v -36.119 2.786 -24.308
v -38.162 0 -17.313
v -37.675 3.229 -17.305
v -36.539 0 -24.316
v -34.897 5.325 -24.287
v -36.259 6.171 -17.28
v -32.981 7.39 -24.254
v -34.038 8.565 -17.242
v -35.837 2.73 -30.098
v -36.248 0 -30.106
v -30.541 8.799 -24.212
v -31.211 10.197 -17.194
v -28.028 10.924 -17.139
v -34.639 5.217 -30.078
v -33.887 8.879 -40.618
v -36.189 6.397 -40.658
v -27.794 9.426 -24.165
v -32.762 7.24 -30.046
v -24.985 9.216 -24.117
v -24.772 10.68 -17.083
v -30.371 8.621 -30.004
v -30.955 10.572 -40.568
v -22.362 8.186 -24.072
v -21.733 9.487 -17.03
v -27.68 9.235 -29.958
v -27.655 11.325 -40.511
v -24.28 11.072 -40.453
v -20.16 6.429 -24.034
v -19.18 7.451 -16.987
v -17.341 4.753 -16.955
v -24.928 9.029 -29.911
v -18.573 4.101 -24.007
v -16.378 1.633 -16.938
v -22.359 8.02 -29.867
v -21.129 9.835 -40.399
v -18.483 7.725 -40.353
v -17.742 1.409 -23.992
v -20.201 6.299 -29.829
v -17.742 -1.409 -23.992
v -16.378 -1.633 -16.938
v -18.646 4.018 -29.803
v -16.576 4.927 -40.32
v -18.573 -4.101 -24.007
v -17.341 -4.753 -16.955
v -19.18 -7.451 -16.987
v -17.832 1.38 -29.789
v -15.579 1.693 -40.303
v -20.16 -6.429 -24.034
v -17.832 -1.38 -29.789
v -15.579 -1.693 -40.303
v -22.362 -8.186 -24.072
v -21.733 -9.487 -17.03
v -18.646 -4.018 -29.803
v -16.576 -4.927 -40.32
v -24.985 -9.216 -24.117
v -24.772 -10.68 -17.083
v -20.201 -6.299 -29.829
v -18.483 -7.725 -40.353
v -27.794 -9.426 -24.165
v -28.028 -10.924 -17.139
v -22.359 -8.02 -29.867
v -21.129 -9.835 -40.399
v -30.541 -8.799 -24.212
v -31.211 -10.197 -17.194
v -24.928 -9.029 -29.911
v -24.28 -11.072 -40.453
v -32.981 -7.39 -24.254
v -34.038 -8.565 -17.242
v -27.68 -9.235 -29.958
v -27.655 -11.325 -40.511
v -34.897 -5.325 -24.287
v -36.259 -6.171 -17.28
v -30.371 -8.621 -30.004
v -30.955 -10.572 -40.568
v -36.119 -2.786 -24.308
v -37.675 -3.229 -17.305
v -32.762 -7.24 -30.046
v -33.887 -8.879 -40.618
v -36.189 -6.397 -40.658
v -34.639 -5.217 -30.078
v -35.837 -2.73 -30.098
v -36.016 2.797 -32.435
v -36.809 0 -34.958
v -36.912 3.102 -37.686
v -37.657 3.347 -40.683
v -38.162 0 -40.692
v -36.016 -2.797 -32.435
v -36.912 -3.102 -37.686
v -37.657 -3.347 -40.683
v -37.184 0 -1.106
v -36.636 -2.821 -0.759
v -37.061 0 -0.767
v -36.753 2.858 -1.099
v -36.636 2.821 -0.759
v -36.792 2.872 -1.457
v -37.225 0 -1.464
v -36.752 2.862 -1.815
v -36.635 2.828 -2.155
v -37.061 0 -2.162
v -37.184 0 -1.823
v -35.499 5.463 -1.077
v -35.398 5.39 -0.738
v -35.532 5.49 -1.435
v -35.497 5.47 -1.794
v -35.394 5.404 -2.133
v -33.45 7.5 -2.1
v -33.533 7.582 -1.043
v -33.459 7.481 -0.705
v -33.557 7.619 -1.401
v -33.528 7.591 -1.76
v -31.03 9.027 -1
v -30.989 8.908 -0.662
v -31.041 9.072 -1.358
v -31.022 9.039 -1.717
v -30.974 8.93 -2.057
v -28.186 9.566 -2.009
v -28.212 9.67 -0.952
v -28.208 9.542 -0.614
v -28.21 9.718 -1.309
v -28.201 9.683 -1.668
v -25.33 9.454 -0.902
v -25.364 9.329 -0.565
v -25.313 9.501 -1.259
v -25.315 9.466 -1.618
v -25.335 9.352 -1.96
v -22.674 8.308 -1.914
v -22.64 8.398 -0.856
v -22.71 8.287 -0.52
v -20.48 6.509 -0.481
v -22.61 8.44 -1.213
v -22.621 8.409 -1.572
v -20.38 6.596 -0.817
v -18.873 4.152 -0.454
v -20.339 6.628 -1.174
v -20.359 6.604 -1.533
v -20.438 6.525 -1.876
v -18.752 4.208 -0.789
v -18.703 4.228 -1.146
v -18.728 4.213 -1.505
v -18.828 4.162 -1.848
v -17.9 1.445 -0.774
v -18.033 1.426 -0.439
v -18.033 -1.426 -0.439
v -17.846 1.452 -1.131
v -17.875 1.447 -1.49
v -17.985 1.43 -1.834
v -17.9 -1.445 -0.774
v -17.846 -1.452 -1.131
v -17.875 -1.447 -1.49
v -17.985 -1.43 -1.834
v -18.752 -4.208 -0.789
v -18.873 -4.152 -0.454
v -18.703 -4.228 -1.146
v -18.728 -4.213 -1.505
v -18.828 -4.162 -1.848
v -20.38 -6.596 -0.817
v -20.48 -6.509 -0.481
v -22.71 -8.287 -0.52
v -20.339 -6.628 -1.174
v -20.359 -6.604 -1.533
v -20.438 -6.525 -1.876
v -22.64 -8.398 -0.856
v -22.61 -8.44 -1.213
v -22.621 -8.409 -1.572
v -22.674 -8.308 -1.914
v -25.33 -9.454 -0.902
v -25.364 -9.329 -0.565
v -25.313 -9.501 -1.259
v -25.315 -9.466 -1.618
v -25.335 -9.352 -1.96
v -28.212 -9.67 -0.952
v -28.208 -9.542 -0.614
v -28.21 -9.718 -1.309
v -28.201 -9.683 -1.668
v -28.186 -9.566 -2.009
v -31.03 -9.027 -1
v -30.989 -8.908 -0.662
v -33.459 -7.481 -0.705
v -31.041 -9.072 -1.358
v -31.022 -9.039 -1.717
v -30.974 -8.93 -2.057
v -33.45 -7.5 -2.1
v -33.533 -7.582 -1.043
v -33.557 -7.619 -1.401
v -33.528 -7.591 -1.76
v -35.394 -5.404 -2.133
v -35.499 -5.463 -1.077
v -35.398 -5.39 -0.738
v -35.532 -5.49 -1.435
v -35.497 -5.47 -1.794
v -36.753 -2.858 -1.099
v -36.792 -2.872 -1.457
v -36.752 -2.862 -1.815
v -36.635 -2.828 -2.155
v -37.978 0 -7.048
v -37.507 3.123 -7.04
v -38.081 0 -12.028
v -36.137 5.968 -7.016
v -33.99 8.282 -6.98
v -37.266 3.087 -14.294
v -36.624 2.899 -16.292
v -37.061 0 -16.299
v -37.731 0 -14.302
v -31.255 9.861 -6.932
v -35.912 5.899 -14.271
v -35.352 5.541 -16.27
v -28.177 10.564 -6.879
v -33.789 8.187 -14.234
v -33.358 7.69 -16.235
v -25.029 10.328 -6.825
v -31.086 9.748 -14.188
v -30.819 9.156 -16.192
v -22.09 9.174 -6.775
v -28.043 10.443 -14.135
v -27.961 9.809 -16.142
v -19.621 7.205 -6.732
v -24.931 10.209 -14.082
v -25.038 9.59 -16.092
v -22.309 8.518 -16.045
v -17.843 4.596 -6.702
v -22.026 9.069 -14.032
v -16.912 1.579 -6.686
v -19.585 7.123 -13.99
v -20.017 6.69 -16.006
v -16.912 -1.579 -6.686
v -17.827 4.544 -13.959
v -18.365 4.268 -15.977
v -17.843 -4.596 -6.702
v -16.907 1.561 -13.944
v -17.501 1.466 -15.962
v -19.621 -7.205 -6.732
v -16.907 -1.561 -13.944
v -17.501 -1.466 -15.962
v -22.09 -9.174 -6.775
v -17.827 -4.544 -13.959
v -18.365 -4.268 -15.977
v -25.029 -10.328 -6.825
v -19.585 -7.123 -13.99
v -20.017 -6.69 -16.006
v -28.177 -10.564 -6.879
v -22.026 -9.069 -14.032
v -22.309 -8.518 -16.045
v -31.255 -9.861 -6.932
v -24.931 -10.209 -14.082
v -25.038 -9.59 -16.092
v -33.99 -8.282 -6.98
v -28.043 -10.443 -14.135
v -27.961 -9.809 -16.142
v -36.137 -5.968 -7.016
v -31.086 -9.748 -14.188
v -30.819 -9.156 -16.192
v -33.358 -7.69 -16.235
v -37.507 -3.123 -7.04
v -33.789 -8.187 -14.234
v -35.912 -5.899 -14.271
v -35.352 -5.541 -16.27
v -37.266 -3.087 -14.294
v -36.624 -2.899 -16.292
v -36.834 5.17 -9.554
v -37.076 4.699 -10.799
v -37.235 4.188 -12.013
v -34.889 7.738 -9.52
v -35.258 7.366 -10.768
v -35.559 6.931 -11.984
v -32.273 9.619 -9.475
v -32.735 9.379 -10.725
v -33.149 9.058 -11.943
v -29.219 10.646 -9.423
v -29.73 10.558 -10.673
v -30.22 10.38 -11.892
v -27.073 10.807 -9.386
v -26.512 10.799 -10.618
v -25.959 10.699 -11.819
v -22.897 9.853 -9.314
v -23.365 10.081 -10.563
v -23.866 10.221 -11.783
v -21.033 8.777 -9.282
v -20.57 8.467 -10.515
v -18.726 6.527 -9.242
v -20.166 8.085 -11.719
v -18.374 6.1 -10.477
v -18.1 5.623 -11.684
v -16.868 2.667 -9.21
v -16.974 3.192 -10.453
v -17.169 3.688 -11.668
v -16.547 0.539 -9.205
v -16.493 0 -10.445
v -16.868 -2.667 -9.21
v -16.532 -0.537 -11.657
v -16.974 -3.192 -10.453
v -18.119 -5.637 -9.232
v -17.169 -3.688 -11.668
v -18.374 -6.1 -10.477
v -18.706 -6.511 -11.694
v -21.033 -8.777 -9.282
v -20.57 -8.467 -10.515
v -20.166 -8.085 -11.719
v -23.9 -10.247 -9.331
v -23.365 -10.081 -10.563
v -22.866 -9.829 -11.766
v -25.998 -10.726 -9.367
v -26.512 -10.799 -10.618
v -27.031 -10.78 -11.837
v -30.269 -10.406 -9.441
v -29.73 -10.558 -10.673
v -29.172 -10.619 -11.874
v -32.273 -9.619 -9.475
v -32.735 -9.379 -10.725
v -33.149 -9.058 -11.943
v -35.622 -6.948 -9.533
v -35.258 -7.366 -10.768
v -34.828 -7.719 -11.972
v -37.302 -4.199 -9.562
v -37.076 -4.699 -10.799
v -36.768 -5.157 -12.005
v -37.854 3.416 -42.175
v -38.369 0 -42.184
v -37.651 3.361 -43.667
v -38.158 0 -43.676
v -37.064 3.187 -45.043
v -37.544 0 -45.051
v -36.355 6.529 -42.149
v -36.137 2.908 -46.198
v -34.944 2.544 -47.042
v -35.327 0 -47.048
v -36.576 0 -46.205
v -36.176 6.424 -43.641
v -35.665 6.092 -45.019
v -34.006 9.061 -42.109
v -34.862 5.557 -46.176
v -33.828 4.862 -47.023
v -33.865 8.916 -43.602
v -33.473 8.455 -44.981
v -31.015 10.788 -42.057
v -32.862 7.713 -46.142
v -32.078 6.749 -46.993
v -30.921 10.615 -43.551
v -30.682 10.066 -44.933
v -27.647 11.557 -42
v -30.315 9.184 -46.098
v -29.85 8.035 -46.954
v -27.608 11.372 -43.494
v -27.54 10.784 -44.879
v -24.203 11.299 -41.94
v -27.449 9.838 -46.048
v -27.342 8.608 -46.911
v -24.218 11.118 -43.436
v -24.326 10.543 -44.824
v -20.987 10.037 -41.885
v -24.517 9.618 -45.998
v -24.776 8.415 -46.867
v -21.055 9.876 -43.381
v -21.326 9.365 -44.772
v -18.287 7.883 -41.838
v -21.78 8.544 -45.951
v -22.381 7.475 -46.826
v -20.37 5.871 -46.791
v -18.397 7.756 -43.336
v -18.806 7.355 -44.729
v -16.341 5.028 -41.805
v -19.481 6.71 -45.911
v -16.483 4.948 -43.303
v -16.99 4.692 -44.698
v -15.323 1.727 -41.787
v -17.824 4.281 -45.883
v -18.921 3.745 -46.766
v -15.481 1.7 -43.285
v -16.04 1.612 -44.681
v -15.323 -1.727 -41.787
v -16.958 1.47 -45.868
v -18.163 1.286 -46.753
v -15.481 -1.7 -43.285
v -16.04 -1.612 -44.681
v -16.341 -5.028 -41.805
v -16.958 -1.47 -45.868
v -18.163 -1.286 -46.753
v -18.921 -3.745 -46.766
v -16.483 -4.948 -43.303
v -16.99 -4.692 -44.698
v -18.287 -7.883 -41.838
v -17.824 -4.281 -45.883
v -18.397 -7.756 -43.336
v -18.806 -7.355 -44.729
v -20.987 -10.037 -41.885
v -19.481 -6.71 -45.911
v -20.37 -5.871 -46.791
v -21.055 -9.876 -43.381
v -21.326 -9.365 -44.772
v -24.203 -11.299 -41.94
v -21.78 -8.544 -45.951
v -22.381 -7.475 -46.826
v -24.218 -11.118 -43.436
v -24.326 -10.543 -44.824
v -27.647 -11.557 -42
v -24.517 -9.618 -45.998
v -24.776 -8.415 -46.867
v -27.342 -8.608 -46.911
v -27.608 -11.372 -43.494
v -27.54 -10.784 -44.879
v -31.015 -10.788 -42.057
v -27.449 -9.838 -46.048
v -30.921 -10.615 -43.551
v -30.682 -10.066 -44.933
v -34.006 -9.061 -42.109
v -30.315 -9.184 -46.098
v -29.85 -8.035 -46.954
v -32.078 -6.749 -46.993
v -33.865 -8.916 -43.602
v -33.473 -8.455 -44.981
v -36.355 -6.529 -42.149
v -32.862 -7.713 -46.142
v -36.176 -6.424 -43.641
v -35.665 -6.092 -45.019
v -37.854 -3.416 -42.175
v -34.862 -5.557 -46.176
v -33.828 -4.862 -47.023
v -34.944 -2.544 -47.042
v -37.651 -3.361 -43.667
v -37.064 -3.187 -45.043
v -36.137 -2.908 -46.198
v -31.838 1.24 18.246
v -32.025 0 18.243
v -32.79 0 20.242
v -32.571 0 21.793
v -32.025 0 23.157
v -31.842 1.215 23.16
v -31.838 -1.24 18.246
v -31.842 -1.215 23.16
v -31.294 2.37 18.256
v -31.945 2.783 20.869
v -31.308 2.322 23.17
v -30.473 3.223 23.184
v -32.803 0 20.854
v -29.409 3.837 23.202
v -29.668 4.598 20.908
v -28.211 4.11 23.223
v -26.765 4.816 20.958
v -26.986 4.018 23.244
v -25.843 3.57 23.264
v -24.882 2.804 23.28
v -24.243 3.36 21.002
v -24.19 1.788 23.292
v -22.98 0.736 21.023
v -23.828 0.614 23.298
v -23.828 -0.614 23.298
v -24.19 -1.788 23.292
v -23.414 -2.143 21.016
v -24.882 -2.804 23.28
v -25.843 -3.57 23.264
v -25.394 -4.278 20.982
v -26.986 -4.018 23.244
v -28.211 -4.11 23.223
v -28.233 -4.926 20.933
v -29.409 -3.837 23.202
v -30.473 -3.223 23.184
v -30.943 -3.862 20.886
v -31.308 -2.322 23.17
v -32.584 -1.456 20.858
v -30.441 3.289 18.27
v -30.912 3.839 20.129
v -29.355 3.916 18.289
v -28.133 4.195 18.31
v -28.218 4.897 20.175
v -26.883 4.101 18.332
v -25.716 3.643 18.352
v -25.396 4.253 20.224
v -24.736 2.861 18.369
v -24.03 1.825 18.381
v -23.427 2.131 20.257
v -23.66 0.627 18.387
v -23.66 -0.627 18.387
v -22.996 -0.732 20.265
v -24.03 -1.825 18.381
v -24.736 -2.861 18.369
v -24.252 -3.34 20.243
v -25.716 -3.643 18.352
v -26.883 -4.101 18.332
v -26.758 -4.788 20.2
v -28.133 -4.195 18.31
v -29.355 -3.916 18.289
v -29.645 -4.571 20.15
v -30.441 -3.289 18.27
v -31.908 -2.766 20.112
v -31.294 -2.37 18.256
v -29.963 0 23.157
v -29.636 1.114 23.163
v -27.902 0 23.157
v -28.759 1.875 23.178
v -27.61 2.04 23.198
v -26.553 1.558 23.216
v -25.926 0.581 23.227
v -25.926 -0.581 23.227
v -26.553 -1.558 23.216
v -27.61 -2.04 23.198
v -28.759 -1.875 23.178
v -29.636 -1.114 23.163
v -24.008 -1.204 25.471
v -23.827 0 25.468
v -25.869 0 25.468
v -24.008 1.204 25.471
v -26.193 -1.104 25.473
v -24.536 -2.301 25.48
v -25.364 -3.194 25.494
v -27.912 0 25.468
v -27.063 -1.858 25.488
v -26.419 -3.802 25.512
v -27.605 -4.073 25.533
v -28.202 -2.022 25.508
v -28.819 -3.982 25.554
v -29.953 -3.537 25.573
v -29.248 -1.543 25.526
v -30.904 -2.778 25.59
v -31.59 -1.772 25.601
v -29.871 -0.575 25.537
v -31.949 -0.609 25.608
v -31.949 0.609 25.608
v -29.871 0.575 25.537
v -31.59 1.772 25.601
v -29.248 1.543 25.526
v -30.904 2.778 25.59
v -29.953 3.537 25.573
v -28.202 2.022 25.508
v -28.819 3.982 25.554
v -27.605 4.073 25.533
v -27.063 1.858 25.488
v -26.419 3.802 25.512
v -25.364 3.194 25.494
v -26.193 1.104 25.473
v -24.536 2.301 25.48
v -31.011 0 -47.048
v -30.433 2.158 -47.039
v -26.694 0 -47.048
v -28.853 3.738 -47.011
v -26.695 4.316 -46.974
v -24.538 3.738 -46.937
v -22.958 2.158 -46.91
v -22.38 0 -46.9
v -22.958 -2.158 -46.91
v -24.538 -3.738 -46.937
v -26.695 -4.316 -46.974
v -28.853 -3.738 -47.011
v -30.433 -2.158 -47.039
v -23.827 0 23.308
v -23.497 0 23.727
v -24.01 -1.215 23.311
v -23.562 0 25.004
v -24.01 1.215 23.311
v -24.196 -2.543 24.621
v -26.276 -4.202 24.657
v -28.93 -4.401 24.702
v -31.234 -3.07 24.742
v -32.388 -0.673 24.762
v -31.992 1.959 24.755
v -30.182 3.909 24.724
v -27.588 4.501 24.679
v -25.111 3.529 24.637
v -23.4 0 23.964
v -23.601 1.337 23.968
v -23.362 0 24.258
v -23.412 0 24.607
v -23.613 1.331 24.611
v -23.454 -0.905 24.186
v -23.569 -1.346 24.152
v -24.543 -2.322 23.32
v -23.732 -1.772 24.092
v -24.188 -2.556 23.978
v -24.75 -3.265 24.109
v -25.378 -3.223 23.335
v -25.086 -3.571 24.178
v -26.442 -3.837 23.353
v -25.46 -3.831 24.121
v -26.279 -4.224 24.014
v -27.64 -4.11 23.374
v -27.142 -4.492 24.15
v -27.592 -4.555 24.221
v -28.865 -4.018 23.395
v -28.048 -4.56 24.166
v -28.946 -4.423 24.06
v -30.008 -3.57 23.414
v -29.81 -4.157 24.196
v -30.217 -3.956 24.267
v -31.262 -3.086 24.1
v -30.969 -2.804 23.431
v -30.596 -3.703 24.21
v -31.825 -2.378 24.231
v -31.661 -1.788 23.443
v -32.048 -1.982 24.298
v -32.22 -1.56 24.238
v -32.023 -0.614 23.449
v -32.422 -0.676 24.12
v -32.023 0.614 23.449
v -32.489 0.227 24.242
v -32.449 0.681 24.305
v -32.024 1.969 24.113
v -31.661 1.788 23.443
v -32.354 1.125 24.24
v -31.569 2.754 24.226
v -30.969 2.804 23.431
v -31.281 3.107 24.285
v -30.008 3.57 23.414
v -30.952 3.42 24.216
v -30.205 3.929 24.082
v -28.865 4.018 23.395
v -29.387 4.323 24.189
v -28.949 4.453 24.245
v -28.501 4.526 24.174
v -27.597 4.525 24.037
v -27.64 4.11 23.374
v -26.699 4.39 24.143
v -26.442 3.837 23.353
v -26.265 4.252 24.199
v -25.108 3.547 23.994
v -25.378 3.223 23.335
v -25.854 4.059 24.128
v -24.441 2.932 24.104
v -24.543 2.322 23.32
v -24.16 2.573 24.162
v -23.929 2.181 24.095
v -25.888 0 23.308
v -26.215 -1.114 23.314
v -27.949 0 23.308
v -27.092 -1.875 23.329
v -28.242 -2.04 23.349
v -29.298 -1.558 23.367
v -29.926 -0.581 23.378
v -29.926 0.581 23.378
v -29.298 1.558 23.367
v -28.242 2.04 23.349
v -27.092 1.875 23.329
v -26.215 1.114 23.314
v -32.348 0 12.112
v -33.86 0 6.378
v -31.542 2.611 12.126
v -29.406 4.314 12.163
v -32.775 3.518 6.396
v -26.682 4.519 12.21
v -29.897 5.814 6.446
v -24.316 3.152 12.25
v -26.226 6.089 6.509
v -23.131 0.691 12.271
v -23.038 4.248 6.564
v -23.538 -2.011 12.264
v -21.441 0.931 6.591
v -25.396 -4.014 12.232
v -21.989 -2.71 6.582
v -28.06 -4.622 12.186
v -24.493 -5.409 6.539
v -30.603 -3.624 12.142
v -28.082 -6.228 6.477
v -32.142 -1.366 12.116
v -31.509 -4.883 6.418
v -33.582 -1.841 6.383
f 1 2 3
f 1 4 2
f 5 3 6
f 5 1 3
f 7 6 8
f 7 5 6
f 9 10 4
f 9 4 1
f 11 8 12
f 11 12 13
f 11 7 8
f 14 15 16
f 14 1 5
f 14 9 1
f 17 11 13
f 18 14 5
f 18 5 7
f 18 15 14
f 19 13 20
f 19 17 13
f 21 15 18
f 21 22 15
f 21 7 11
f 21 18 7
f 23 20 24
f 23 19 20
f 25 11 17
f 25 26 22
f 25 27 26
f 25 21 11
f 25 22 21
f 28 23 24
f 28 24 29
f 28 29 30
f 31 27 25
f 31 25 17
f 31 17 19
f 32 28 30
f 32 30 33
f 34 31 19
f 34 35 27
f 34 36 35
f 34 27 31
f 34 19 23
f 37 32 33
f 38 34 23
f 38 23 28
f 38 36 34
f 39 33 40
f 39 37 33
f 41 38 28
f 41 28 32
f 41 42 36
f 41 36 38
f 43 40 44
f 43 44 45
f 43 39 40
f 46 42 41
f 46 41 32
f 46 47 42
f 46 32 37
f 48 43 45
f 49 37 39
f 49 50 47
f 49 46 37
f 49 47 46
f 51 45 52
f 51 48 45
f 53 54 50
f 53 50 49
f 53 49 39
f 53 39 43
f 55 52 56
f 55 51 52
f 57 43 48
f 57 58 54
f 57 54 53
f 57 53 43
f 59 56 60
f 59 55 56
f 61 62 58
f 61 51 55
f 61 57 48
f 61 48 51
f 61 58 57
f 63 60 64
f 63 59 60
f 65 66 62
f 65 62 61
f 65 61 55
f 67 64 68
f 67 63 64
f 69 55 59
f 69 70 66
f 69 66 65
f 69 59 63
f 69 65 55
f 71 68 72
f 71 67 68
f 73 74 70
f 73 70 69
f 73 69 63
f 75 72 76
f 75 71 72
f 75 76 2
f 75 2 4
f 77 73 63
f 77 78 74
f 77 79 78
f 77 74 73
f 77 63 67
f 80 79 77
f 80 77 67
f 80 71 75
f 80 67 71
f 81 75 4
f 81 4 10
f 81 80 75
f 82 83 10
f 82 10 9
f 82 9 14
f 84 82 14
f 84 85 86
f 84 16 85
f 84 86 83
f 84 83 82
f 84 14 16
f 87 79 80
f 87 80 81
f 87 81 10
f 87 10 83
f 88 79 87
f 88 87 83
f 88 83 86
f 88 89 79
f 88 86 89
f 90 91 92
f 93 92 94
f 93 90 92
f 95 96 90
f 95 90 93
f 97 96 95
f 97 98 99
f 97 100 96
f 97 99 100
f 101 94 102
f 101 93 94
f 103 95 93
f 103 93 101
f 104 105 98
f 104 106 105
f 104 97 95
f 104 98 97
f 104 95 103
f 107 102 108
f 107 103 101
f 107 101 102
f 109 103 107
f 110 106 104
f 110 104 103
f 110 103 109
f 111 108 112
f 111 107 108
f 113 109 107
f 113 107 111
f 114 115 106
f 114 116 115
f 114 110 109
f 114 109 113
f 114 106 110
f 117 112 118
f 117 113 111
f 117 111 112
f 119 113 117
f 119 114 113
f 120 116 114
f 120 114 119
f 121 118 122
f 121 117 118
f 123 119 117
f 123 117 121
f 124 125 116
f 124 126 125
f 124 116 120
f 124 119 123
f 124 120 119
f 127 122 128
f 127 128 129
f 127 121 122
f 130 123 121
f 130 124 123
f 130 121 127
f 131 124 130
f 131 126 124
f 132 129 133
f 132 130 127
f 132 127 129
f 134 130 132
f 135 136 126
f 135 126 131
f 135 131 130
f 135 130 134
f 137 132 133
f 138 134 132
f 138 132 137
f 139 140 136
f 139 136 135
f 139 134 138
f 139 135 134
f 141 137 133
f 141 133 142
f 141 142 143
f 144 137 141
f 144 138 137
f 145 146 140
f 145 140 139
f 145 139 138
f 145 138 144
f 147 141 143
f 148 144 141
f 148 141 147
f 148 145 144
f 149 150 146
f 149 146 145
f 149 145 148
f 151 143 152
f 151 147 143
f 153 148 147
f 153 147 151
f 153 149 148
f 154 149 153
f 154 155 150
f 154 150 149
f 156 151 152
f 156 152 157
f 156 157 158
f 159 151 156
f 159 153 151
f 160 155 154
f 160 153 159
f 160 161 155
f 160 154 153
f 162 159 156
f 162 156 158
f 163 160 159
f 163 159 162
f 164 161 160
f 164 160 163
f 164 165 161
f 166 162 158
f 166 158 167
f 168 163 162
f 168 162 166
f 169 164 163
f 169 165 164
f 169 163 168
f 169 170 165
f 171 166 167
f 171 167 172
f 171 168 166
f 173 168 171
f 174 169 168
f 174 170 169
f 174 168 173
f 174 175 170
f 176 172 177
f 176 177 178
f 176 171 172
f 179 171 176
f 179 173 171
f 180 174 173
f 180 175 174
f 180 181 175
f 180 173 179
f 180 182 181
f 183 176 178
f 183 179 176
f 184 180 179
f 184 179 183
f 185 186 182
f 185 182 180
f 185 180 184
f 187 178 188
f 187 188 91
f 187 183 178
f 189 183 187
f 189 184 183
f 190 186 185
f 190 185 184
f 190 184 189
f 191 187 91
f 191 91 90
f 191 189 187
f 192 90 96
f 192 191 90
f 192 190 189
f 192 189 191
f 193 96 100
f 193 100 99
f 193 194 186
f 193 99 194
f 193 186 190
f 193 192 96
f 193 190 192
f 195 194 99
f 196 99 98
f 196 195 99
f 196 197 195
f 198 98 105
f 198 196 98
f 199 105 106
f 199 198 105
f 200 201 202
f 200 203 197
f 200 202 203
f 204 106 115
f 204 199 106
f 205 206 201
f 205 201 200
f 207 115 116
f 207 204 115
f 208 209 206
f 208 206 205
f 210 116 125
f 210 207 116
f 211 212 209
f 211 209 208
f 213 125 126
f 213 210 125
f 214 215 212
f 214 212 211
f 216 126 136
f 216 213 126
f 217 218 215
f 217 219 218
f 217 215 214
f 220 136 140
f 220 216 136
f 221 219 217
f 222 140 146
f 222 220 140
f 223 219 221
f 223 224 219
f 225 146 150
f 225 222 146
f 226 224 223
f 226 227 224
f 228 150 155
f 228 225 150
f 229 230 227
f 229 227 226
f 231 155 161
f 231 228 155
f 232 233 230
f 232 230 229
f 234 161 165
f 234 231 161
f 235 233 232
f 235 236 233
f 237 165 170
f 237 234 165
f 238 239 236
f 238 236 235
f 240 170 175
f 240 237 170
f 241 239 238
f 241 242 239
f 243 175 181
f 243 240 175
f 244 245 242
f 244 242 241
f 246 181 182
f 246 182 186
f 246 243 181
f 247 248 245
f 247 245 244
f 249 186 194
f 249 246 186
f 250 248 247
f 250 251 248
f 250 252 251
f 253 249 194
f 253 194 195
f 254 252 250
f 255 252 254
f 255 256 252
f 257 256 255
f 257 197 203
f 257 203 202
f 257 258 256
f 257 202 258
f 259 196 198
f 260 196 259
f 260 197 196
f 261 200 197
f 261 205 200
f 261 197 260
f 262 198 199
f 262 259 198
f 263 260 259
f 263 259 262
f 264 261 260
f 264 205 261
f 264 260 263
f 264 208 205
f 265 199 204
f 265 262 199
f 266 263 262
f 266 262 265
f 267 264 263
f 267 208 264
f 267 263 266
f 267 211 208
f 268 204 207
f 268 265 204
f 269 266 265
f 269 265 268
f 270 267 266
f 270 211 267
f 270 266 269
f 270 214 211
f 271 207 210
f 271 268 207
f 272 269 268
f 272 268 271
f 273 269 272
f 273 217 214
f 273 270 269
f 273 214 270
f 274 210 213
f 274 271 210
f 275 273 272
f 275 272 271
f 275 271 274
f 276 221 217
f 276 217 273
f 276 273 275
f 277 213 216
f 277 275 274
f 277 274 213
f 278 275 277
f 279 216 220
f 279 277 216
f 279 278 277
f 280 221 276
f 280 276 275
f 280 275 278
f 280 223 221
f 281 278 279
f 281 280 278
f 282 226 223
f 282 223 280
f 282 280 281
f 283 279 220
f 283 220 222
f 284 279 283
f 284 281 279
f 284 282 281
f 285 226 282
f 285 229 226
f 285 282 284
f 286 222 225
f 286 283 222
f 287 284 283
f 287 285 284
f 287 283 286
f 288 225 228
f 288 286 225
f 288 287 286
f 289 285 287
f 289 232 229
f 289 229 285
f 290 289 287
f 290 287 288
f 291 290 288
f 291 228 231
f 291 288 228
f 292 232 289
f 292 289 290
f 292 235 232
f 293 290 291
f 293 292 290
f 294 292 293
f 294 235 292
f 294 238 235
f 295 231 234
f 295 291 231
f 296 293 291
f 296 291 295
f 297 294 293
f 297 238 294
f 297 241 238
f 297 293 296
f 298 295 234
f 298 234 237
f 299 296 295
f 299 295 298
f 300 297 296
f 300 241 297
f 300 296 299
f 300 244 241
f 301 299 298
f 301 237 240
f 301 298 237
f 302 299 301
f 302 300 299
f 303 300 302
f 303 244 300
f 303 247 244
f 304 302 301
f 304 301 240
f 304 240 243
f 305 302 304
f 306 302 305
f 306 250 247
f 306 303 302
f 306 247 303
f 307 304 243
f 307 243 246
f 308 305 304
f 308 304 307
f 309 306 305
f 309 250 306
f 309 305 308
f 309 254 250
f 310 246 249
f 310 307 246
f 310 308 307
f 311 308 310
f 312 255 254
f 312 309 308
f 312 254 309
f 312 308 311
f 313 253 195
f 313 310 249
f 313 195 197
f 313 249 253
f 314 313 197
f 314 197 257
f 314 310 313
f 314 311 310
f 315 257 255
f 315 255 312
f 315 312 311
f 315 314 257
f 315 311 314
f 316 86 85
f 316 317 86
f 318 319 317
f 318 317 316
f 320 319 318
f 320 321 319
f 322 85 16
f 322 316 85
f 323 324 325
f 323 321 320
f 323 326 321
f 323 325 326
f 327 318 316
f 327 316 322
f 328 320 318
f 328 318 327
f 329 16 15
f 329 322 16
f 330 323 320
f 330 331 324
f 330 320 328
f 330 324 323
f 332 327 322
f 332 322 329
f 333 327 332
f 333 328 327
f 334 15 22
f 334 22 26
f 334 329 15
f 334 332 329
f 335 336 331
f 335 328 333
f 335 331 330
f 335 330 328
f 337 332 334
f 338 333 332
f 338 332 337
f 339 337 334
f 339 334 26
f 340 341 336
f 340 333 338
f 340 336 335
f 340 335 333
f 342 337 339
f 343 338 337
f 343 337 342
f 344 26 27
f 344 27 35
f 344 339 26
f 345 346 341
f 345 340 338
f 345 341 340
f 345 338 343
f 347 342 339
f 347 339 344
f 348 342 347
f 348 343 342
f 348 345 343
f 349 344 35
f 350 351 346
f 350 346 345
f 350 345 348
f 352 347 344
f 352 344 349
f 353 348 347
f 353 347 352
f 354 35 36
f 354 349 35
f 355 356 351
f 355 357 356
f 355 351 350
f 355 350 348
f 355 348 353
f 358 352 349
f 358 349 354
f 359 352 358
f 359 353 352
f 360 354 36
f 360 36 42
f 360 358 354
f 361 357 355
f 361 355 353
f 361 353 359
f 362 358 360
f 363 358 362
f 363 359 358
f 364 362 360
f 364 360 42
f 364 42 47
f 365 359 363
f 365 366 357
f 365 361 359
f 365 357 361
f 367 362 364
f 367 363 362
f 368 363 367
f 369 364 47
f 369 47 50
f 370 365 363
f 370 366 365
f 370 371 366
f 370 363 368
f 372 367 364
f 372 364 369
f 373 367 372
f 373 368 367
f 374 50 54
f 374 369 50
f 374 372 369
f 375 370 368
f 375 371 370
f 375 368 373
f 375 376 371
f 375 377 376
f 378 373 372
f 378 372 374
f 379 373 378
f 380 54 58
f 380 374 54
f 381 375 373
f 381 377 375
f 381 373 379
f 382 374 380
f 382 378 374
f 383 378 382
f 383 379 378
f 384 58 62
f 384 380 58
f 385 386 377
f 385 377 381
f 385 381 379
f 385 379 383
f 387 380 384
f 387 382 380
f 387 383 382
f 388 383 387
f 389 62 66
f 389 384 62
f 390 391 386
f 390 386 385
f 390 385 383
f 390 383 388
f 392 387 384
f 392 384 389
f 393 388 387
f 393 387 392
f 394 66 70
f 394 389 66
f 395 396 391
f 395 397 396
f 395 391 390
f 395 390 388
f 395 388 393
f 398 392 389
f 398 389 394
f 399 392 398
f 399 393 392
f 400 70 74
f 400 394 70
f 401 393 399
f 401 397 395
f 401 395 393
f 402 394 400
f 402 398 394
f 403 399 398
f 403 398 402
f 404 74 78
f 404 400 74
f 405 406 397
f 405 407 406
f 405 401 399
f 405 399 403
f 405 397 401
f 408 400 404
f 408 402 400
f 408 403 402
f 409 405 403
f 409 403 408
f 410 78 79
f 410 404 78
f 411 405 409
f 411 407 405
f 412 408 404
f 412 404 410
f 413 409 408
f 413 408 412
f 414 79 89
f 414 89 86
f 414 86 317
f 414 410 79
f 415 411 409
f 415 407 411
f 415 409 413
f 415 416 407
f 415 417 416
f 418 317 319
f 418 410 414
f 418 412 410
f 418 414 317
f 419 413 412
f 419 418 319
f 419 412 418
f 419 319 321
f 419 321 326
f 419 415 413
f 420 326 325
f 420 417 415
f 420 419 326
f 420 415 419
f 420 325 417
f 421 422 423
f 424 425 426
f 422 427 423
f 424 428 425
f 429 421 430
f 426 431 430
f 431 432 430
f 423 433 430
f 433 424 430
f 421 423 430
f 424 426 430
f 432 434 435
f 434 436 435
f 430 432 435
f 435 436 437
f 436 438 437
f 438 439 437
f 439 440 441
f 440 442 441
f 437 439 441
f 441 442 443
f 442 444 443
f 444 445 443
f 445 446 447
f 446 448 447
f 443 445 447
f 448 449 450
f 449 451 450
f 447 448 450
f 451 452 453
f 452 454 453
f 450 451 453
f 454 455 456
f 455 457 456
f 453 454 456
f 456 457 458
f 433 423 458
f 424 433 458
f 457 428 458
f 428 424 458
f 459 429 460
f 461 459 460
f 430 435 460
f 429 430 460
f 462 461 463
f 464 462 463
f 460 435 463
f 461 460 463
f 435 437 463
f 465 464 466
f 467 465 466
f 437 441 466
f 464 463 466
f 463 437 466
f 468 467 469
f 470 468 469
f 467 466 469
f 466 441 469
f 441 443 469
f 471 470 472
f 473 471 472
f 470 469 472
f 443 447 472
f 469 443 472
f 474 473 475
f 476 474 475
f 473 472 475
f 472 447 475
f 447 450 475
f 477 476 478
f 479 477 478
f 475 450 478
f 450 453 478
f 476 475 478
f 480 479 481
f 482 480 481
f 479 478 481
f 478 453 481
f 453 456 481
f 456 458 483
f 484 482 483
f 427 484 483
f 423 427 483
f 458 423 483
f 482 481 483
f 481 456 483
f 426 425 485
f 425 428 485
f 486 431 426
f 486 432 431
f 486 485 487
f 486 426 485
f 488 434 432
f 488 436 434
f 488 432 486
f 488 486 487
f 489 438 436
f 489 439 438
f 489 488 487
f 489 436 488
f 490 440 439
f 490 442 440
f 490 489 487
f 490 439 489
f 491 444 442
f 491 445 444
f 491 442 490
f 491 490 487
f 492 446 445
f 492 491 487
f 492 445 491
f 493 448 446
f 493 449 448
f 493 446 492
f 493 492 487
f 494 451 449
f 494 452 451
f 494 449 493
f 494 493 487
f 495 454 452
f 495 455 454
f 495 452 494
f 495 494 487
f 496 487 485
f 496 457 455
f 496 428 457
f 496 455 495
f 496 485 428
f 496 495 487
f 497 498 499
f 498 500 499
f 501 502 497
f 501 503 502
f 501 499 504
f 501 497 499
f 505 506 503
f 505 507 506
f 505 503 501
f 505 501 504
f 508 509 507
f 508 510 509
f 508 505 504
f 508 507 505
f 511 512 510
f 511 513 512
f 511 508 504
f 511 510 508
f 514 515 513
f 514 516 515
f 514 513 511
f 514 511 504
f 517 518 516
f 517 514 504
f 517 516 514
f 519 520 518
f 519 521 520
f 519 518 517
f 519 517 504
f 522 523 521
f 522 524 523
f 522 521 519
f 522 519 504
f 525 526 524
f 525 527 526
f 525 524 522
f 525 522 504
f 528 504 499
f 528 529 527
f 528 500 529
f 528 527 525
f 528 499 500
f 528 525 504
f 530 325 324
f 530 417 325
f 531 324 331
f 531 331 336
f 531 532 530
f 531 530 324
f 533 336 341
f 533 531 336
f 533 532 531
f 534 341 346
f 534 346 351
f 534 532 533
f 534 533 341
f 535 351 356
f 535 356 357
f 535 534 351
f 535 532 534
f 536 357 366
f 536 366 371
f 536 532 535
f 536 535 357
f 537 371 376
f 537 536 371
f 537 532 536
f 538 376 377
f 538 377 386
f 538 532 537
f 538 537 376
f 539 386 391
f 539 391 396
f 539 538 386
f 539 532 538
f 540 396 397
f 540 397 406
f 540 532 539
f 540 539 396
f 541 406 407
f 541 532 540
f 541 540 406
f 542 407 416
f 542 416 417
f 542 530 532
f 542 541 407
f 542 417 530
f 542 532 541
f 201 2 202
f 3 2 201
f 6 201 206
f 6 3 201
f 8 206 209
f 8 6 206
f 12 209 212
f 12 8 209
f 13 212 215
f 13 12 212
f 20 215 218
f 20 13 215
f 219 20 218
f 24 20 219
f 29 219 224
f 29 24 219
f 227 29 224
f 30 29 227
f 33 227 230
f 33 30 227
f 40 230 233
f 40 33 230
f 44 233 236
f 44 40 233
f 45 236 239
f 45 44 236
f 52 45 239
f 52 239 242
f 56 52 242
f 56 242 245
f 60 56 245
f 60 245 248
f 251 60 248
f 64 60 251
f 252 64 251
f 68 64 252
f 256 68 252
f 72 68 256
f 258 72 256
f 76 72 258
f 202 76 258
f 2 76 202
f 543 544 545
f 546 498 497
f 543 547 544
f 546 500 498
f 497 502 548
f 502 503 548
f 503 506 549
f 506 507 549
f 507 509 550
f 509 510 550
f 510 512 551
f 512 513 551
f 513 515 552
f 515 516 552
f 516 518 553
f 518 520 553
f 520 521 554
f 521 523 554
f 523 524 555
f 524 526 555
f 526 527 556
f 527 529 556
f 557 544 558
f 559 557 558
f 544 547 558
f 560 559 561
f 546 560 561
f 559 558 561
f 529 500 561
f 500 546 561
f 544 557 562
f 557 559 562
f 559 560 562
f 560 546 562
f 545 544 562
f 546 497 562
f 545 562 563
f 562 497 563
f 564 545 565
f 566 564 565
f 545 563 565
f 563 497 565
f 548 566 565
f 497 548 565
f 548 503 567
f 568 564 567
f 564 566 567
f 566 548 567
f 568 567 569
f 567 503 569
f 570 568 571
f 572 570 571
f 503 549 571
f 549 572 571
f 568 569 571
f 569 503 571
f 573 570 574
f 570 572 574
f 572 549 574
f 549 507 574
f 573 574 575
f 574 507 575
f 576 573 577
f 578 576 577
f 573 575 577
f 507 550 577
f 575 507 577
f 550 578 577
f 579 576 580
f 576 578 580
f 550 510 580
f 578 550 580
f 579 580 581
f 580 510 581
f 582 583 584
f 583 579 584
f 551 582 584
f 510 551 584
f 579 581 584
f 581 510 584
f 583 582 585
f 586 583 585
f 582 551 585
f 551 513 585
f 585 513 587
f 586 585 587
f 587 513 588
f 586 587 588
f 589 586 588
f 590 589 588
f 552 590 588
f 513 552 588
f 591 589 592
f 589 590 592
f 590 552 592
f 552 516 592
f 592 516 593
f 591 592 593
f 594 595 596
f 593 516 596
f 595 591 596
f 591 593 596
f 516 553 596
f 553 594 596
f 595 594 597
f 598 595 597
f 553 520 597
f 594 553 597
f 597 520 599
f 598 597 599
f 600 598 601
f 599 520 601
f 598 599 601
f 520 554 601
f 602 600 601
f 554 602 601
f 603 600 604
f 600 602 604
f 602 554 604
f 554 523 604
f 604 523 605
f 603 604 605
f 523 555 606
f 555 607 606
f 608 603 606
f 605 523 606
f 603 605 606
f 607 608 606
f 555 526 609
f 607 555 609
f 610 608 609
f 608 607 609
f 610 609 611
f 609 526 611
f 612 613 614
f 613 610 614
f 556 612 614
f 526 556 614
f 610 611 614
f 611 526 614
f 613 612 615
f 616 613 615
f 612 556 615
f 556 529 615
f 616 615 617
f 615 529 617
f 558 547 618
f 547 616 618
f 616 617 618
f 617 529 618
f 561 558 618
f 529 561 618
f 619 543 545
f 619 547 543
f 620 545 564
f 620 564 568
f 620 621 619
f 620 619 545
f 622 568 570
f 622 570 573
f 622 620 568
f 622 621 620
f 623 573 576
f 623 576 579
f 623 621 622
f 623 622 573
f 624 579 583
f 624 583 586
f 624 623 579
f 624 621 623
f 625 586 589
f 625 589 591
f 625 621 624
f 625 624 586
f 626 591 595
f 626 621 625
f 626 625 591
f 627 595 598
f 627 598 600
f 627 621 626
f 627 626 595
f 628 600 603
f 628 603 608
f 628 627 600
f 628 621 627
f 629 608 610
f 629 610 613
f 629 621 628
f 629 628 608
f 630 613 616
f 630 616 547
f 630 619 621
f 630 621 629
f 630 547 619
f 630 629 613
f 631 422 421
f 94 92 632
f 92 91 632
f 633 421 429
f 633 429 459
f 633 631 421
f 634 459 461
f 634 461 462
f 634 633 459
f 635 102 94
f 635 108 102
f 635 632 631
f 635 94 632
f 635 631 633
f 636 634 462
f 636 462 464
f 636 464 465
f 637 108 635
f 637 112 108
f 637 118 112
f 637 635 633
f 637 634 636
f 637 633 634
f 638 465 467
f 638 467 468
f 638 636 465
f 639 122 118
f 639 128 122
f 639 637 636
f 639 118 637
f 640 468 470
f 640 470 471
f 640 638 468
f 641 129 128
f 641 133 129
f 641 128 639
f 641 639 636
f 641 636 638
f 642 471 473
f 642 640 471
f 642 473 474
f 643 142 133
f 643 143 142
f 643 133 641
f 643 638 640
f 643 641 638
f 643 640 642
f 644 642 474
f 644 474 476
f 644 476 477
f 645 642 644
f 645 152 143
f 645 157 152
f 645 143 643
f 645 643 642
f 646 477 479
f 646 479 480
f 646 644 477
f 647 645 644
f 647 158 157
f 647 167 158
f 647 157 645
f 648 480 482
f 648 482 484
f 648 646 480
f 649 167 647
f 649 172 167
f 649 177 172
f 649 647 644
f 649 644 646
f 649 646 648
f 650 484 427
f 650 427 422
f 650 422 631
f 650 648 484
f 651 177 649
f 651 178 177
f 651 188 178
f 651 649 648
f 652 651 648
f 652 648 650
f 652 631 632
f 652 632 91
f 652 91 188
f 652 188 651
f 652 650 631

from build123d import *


with BuildPart() as f1:
    # F0 (on Front) → F1 (revolve)
    with BuildSketch(Plane.XZ):
        with BuildLine():
            Line((-27.8176129689, 18.2430874556), (-32.0246070623, 18.2430874556))
            add(Edge.make_bspline(
                [(-32.0246070623, 18.2430874556), (-31.919579953, 11.3113634288), (-32.8484103084, 7.6850618352), (-37.0609350502, -0.7666411693)],
                knots=[0, 0, 0, 0, 19.6655633531, 19.6655633531, 19.6655633531, 19.6655633531], degree=3))
            ThreePointArc((-37.0609350502, -0.7666411693), (-37.2251563452, -1.4642624592), (-37.0609350502, -2.1618837491))
            add(Edge.make_bspline(
                [(-37.0609350502, -2.1618837491), (-38.2803045213, -6.7345271818), (-38.7469107343, -12.6484790817), (-37.0609350502, -16.2990570642)],
                knots=[0, 0, 0, 0, 14.1371733151, 14.1371733151, 14.1371733151, 14.1371733151], degree=3))
            Line((-37.0609350502, -16.2990570642), (-38.1619296968, -17.3131749908))
            add(Edge.make_bspline(
                [(-38.1619296968, -17.3131749908), (-36.0144041479, -24.7142240405), (-35.1553931832, -30.12599051), (-38.1619296968, -40.691819042)],
                knots=[0, 0, 0, 0, 23.3786440512, 23.3786440512, 23.3786440512, 23.3786440512], degree=3))
            ThreePointArc((-38.1619296968, -40.691819042), (-37.8988129309, -44.3848913189), (-35.3271961212, -47.0484979451))
            Line((-35.3271961212, -47.0484979451), (-26.6941422597, -47.0484979451))
            Line((-26.6941422597, -47.0484979451), (-27.8176129689, 18.2430874556))
        make_face()
        with BuildLine():
            add(Edge.make_bspline(
                [(-32.0246070623, 18.2430874556), (-32.9081639647, 20.3592814505), (-33.243983984, 20.3592814505), (-32.0246070623, 23.1572017074)],
                knots=[0, 0, 0, 0, 4.9141142517, 4.9141142517, 4.9141142517, 4.9141142517], degree=3))
            Line((-32.0246070623, 18.2430874556), (-27.8176129689, 18.2430874556))
            Line((-27.8176129689, 18.2430874556), (-27.9021700123, 23.1572017074))
            Line((-27.9021700123, 23.1572017074), (-32.0246070623, 23.1572017074))
        make_face()
    revolve(axis=Axis((-27.298156136, 0, -11.9456481189), (0.0172044287, 0, -0.9998519929)))


with BuildPart() as f4:
    # F3 (on face) → F4 (revolve)
    with BuildSketch(Plane(origin=(0, 0, 0), x_dir=(-1, 0, 0), z_dir=(0, 1, 0))):
        with BuildLine():
            add(Edge.make_bspline(
                [(23.8265637308, 23.3080498874), (23.3356971294, 23.7989127636), (23.0902675539, 24.3388619274), (23.8265637308, 25.4678465426)],
                knots=[0, 0, 0, 0, 2.1597966552, 2.1597966552, 2.1597966552, 2.1597966552], degree=3))
            Line((23.8265637308, 23.3080498874), (27.9490007808, 23.3080498874))
            Line((27.9490007808, 23.3080498874), (27.9118372127, 25.4678465426))
            Line((27.9118372127, 25.4678465426), (23.8265637308, 25.4678465426))
        make_face()
    revolve(axis=Axis((-27.9304189968, 0, 24.387948215), (-0.0172044287, 0, -0.9998519929)))


solid = Compound([f1.part, f4.part])
